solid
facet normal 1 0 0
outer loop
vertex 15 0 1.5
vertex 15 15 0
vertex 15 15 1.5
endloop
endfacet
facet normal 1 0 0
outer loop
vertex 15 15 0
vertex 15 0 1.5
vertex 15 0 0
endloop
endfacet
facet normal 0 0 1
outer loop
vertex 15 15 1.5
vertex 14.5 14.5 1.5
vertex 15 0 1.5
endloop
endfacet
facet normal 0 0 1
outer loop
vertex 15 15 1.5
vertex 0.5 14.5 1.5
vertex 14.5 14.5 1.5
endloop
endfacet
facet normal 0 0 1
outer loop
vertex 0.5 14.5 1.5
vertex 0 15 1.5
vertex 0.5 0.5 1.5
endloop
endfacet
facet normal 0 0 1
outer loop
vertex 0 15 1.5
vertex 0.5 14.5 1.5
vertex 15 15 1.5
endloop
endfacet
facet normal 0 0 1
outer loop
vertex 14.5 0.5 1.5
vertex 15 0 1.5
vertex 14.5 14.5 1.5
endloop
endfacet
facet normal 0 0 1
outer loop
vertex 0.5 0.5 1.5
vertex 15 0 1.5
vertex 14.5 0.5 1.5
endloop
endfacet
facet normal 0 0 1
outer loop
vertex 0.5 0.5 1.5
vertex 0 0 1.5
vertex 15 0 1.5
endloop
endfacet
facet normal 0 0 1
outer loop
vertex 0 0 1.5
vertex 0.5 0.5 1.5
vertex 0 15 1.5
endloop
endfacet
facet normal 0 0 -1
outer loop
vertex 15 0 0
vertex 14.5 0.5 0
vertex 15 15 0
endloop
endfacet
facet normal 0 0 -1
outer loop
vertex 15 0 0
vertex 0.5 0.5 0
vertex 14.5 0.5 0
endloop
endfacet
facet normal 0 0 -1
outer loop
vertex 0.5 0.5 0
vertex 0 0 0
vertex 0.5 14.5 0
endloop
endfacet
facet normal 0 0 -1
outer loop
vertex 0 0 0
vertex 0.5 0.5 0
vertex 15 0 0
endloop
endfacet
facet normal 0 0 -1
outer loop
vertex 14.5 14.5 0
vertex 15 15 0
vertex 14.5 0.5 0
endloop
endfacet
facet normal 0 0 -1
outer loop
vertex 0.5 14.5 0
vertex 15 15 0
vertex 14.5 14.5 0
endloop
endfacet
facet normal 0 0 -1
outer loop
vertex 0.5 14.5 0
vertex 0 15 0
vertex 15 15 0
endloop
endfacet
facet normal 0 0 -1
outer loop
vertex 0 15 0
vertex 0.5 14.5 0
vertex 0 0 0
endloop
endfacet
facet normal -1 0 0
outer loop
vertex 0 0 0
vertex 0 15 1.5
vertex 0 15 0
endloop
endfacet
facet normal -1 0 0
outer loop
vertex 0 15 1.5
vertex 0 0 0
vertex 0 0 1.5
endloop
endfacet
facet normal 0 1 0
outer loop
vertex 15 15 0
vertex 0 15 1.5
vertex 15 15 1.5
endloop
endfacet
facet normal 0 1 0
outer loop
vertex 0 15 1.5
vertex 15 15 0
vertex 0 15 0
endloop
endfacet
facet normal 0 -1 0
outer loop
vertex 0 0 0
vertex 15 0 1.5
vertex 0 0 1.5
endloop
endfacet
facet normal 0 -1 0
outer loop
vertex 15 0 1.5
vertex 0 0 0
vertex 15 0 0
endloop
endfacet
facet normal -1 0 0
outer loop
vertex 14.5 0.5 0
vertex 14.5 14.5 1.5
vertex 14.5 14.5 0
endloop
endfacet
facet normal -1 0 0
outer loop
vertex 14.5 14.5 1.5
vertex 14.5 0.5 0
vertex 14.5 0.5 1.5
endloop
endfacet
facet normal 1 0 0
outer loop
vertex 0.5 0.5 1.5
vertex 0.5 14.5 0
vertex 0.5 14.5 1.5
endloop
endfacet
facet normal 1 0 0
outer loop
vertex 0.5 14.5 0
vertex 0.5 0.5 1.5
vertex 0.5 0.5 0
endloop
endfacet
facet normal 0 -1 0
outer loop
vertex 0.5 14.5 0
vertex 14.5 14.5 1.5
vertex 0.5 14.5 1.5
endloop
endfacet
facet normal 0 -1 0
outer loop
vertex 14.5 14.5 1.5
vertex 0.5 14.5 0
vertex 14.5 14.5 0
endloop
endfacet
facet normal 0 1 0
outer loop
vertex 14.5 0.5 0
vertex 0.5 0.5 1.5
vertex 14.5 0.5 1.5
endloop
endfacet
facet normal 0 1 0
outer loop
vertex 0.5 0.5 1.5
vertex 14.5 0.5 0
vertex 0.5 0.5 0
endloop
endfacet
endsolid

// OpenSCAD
difference(){
scale([1,1,0.1])
	cube(15);
translate([0.5,0.5,-0.10])
scale([1,1,0.3])
	cube(14);
}
